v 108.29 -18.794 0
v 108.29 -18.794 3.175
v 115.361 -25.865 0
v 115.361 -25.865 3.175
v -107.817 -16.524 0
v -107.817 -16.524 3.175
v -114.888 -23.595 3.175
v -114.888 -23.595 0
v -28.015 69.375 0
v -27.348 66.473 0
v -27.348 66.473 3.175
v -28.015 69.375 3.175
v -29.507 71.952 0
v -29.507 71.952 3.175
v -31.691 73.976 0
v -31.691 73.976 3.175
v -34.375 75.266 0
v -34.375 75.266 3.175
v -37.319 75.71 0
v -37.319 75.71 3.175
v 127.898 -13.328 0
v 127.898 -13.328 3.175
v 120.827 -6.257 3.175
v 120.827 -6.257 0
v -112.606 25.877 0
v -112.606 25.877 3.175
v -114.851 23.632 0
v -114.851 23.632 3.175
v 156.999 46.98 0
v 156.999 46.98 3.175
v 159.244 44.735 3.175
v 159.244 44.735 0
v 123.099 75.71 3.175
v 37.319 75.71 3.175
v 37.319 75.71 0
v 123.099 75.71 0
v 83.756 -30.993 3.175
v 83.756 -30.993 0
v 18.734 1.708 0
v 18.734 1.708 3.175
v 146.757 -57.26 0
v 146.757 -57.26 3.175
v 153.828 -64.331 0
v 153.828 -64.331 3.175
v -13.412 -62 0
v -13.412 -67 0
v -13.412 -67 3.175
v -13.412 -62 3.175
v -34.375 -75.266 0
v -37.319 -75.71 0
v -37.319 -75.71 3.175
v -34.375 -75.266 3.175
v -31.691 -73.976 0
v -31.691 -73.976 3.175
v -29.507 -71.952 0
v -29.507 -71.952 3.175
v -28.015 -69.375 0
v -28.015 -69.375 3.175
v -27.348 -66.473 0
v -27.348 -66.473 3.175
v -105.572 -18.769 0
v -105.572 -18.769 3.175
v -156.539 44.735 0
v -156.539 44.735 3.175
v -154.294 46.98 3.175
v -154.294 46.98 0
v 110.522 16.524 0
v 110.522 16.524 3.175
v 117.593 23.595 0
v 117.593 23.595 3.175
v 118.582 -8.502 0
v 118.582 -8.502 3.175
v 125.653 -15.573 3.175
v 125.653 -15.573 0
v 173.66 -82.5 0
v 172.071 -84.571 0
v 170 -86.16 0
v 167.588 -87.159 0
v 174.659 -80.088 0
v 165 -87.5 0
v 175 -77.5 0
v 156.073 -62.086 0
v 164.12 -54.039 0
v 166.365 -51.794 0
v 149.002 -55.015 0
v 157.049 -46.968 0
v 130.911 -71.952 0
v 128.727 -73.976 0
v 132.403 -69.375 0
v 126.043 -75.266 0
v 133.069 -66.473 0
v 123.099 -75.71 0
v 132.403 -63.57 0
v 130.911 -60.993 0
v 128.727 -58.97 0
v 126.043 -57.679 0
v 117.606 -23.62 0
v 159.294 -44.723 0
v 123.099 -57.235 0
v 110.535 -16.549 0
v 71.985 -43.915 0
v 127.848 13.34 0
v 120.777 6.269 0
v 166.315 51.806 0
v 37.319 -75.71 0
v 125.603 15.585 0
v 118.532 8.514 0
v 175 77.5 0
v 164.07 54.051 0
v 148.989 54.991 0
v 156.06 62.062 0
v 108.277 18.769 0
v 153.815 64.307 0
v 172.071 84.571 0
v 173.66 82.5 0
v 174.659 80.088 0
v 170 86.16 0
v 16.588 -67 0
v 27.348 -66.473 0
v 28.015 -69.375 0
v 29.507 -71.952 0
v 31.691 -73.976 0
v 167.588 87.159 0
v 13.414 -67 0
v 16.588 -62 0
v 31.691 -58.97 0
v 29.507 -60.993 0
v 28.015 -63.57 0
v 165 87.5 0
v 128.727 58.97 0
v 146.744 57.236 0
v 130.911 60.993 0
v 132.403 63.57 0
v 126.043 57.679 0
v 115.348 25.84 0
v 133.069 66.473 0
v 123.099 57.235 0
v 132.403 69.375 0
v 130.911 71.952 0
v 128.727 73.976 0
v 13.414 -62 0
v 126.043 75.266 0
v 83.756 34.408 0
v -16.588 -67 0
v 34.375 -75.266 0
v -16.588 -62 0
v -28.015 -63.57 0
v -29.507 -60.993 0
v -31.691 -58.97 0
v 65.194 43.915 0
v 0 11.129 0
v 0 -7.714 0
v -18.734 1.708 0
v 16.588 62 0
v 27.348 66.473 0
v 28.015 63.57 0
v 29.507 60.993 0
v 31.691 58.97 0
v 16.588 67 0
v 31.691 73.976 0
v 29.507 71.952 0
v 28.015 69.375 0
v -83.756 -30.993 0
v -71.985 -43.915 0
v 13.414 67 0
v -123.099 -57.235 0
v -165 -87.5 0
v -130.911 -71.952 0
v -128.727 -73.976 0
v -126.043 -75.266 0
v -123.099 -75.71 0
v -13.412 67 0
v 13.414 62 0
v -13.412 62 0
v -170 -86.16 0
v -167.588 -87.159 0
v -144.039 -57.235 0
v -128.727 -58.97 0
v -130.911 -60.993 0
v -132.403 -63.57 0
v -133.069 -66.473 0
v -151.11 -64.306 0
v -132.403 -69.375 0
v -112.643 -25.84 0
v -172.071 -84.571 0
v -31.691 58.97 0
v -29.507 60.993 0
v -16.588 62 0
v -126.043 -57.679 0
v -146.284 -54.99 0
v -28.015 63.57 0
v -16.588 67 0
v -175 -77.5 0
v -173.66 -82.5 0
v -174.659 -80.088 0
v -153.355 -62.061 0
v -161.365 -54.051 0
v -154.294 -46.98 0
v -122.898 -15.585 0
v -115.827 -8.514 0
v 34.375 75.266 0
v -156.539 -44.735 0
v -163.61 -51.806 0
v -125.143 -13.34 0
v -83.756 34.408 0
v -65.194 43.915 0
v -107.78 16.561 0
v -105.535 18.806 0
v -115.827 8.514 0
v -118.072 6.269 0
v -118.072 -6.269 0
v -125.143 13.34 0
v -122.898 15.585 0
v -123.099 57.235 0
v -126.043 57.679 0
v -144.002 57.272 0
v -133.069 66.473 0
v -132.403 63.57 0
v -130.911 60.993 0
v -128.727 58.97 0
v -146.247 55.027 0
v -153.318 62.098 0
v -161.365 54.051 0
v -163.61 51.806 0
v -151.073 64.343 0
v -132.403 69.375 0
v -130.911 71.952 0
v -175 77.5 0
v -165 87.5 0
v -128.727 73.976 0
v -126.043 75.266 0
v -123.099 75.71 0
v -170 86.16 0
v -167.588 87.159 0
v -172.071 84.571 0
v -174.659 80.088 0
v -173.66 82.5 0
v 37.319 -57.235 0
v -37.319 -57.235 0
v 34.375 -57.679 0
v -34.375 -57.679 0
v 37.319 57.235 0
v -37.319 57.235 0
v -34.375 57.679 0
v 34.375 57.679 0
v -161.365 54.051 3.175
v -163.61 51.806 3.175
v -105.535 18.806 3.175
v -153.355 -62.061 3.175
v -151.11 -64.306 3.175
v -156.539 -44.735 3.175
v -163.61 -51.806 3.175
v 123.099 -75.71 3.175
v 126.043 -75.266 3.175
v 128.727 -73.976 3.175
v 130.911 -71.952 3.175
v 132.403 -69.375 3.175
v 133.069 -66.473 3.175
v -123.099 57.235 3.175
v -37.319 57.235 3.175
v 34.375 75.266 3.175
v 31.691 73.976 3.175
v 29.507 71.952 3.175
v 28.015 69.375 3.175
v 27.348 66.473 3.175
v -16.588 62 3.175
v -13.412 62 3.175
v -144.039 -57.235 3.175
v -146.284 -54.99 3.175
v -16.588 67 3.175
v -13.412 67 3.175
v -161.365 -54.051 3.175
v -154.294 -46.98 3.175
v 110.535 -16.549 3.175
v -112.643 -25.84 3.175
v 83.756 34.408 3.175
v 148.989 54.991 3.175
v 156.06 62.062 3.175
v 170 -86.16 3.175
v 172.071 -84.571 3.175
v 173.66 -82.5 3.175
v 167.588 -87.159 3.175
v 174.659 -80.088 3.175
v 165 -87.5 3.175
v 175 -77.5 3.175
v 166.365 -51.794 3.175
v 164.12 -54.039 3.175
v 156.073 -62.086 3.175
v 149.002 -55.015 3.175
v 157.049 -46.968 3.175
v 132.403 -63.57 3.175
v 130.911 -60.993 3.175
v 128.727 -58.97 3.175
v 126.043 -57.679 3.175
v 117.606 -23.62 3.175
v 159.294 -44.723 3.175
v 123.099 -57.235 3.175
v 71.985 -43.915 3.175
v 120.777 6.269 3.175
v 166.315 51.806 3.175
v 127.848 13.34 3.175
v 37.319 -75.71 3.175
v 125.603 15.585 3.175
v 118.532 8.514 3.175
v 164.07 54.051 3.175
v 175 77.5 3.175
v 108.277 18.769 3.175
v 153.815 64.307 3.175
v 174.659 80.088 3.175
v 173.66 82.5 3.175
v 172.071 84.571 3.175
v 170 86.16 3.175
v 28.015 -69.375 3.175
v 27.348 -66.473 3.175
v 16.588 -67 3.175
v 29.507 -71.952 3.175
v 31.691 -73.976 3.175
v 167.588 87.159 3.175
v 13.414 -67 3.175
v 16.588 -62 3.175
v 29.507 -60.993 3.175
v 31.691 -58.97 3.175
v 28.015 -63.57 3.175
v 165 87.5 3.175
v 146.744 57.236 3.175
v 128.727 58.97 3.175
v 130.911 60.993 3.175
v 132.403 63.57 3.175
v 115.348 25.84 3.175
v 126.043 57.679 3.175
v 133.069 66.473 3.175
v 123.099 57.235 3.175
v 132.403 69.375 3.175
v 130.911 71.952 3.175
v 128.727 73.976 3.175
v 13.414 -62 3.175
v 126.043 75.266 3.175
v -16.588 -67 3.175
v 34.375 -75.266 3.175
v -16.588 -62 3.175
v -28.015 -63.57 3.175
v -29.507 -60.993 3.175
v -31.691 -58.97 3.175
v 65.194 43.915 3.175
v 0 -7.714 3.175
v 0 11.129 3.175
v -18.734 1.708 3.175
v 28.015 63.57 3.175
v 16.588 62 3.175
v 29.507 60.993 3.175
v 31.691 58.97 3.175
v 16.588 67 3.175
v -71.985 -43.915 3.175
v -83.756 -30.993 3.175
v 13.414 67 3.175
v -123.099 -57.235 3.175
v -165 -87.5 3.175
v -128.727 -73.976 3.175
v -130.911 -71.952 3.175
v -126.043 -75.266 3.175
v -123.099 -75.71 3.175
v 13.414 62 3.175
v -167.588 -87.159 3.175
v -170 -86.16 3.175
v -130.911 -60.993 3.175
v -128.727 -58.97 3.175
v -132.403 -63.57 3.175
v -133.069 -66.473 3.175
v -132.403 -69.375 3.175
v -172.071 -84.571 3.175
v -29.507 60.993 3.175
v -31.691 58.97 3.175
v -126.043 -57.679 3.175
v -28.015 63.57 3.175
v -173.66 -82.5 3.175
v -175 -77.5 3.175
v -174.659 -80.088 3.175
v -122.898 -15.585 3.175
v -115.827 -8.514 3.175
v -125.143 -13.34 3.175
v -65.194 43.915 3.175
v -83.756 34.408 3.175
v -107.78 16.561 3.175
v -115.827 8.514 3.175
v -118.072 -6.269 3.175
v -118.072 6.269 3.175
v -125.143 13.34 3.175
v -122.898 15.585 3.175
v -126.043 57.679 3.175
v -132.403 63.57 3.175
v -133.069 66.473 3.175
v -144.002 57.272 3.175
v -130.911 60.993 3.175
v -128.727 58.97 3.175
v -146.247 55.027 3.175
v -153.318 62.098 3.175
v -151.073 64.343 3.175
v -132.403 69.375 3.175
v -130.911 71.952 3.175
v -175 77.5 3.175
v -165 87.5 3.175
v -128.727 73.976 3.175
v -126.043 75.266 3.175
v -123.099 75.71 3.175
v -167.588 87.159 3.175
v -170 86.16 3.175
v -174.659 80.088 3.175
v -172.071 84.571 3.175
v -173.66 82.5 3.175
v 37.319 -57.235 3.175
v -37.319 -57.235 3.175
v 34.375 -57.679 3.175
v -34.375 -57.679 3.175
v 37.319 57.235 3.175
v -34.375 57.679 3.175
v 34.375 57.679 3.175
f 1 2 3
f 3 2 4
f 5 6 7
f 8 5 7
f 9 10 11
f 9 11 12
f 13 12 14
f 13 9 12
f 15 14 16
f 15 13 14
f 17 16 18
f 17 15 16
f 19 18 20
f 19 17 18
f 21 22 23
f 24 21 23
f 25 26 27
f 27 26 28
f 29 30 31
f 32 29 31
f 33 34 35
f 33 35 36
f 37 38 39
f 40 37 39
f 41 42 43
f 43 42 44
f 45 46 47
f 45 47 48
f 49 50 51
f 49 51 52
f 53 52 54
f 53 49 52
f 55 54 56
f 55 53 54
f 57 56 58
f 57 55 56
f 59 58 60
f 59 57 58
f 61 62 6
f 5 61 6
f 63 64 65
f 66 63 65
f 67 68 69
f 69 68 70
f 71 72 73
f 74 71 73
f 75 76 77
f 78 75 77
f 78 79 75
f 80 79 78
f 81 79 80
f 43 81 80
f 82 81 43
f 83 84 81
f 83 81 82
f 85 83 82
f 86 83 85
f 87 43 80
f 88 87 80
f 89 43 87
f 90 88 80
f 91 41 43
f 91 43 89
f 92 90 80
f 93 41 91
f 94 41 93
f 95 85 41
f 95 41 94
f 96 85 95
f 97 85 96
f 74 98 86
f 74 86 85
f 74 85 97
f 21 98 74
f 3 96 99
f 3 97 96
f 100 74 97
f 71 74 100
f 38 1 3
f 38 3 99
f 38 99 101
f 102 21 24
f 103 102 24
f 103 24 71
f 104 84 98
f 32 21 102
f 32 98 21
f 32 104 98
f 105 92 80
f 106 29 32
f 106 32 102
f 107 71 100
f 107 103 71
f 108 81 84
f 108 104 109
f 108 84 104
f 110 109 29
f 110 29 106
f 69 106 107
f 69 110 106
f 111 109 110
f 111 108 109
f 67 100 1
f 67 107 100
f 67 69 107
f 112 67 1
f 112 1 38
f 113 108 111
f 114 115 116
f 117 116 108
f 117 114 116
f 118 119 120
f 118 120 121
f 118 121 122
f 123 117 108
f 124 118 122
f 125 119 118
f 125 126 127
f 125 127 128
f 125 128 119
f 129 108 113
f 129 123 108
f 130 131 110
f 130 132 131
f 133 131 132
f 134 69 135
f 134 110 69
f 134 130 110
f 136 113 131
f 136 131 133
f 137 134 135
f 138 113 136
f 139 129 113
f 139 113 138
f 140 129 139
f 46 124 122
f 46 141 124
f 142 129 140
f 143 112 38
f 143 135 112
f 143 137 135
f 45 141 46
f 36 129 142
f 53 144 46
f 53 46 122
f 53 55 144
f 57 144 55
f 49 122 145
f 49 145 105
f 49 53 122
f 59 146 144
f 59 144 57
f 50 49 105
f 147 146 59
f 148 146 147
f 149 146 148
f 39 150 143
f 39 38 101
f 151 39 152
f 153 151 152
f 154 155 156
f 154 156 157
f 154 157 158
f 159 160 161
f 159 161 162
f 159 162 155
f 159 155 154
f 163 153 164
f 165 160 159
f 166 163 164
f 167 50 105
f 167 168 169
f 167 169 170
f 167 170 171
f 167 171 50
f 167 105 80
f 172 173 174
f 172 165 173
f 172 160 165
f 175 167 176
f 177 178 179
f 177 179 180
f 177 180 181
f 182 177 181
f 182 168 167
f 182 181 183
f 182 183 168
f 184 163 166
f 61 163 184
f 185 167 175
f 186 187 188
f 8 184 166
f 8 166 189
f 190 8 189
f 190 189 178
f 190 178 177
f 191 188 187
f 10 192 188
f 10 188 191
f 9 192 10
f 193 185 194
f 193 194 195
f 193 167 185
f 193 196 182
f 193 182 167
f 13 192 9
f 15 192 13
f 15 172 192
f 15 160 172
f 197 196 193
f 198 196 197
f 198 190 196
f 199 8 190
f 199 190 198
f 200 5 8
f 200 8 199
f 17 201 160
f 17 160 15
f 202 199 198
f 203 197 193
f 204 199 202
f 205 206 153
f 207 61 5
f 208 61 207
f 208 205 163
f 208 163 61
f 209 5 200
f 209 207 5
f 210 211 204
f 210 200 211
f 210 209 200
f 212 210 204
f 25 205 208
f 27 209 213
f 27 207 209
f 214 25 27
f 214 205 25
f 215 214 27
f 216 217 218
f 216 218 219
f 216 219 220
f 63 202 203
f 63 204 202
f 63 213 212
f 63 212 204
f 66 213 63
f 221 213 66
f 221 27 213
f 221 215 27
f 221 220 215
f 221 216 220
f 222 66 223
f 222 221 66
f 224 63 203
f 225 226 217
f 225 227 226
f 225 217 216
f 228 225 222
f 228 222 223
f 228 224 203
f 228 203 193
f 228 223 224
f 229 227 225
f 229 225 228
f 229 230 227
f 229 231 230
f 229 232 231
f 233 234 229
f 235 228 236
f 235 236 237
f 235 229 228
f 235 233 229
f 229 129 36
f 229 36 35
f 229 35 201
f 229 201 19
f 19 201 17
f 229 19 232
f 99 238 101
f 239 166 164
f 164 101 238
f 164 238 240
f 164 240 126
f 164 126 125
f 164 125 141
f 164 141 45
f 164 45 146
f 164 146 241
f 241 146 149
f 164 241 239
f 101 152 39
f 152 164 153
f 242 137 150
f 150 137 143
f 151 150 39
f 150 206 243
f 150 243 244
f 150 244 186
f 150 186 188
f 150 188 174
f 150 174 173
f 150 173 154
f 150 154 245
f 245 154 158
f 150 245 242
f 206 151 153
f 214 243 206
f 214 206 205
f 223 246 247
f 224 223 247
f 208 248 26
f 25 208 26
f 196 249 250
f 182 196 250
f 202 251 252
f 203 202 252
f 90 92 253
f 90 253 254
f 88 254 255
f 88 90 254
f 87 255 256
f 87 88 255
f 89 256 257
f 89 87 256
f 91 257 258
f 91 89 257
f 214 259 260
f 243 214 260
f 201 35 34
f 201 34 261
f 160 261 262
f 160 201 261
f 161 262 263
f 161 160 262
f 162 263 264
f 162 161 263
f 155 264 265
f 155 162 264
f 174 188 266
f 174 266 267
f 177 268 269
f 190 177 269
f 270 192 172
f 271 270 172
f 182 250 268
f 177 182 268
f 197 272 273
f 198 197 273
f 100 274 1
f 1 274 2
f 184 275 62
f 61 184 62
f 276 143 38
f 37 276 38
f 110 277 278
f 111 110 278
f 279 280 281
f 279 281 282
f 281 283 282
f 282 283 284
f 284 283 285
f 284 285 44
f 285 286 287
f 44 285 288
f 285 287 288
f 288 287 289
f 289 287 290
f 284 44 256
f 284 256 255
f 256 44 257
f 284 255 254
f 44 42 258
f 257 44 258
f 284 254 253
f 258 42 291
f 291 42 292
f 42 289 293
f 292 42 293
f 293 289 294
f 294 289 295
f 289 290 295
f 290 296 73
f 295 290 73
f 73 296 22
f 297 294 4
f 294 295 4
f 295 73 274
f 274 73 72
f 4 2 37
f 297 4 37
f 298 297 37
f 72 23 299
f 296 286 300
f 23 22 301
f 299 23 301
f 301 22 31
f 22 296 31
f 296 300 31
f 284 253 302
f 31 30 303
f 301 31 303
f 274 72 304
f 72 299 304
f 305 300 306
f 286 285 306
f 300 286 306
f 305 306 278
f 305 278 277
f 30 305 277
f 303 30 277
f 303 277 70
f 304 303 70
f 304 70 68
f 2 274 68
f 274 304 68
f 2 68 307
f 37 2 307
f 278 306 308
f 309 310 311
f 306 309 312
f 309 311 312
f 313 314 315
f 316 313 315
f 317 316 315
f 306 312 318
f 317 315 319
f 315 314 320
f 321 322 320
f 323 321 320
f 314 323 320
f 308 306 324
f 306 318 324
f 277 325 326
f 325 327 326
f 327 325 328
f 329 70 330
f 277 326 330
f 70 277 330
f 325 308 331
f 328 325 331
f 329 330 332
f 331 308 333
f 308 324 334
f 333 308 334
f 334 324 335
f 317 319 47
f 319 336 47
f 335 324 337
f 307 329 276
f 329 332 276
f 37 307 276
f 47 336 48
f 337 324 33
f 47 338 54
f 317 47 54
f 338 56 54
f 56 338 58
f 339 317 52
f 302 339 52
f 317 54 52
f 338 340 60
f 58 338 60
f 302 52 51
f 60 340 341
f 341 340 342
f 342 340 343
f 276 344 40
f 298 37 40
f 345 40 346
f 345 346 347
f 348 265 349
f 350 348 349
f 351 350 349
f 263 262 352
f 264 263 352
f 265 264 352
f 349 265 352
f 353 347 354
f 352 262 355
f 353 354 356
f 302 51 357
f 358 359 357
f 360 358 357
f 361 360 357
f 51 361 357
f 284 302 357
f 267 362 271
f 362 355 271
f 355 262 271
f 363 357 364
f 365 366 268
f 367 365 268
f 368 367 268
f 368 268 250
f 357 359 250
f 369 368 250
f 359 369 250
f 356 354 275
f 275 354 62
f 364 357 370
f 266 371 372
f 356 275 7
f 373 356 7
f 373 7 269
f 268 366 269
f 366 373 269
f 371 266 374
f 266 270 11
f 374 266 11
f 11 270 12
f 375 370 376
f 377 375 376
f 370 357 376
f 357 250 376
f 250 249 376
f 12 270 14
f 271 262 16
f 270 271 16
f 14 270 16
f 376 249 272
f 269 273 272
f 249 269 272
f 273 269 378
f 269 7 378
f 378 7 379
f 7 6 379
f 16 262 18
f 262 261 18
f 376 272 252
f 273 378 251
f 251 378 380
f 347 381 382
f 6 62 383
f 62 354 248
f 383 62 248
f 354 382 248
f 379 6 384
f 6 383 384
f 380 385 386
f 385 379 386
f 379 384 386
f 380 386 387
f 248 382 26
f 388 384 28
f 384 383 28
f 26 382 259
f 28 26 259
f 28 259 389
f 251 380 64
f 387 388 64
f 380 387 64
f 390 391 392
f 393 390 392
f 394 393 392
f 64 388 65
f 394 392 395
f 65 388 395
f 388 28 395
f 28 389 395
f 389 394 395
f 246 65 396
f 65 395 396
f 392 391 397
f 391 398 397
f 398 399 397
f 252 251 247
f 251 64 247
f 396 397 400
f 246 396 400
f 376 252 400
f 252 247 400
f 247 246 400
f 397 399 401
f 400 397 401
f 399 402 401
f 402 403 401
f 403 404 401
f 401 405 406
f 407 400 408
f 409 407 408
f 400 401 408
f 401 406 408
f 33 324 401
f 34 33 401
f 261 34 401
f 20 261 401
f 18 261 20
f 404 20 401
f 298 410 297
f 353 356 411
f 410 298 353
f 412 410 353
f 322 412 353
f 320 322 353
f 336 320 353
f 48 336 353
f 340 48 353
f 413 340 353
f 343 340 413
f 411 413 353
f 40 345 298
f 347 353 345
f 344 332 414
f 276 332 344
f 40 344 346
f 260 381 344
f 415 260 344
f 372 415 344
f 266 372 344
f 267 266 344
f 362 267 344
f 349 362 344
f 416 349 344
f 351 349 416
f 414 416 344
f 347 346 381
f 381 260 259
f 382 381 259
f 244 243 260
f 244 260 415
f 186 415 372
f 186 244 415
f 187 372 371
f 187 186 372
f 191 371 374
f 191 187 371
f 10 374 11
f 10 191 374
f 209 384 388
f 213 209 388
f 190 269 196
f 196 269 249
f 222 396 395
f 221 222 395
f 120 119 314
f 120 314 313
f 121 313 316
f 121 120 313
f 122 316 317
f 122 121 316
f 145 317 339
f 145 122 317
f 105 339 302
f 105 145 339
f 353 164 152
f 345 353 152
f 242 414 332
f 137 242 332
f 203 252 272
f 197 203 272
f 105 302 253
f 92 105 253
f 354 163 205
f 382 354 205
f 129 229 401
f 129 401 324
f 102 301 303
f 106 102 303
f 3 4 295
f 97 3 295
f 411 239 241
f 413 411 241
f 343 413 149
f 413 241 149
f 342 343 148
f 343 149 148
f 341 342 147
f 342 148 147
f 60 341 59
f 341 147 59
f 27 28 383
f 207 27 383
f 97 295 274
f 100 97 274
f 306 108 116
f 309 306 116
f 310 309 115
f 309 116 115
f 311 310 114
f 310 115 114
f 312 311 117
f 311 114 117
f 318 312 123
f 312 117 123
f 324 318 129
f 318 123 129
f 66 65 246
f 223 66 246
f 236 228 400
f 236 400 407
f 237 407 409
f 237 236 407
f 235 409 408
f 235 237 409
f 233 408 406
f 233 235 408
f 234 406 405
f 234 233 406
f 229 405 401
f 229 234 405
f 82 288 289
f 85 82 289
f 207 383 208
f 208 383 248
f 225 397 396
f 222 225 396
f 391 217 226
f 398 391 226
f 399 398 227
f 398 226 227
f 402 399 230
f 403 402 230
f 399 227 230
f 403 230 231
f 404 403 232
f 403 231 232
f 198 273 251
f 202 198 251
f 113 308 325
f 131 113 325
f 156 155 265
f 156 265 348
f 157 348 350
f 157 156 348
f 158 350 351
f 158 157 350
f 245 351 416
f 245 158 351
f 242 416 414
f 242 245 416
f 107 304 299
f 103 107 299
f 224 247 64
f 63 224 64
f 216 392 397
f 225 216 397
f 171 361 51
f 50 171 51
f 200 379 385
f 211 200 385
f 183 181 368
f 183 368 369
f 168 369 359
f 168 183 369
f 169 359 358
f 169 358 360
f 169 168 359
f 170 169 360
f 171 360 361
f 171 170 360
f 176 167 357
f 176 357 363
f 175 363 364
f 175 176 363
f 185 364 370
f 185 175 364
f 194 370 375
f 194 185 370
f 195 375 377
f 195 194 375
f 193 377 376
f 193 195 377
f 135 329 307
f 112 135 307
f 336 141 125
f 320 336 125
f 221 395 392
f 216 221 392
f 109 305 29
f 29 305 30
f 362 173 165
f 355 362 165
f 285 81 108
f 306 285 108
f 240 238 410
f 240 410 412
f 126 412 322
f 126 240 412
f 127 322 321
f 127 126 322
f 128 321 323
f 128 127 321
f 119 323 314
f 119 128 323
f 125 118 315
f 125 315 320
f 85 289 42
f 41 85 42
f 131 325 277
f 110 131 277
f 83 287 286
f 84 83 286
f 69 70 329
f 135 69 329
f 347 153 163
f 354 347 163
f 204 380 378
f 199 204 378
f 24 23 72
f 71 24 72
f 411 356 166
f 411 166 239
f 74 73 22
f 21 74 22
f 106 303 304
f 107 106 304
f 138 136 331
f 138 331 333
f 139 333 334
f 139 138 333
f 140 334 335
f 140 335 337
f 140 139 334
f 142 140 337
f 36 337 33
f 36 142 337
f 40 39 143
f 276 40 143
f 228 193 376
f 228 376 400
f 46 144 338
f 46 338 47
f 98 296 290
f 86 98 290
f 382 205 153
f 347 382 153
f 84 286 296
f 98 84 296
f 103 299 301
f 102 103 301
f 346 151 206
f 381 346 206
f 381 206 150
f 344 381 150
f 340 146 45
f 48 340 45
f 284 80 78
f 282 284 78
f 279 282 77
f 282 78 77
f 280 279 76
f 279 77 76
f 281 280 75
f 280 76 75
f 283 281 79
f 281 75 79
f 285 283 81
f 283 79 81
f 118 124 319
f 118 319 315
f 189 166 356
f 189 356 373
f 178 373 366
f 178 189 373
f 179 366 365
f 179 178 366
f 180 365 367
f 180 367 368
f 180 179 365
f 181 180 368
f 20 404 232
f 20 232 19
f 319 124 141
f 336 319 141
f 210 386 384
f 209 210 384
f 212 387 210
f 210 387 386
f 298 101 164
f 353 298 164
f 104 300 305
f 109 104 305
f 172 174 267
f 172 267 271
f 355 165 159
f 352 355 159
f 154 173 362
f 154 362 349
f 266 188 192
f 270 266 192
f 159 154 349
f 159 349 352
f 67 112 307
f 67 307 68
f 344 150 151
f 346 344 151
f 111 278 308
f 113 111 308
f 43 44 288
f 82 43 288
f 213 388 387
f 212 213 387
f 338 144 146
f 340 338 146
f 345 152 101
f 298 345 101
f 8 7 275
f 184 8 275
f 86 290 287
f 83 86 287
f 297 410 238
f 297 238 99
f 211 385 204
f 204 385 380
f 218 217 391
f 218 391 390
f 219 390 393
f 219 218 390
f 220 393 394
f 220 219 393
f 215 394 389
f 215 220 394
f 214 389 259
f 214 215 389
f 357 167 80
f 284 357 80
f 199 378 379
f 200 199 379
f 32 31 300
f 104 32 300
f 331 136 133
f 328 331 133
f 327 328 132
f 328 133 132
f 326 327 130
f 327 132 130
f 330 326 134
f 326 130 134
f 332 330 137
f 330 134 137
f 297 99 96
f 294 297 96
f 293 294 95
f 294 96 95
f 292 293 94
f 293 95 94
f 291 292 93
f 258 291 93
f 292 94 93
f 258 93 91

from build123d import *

# Parameters (mm, degrees)
F0_W        = 350
F0_H        = 175
F0_W_2      = 3.175
F0_H_2      = 5
F1_DEPTH    = 3.175
F3_DEPTH    = 25
F4_W        = 105.779197067
F4_H        = 18.4744439814
F5_DEPTH    = 25
F6_T1_DEPTH = 3.175
F6_T3_DEPTH = 53.175
F8_DEPTH    = 25


# Not quite as in the source:
# - a fillet or chamfer that OpenCascade refuses, or shapes differently, is made with other operations: its cross-section is extruded or revolved along the edge and cut away or added


with BuildPart() as f1:
    # F0 (on Top) → F1 (new body)
    with BuildSketch(Plane.XY):
        Rectangle(F0_W, F0_H)
        with Locations((-15, -64.5)):
            Rectangle(F0_W_2, F0_H_2, mode=Mode.SUBTRACT)
        with Locations((15.001, -64.5)):
            Rectangle(F0_W_2, F0_H_2, mode=Mode.SUBTRACT)
        with Locations((-15, 64.5)):
            Rectangle(F0_W_2, F0_H_2, mode=Mode.SUBTRACT)
        with Locations((15.001, 64.5)):
            Rectangle(F0_W_2, F0_H_2, mode=Mode.SUBTRACT)
    extrude(amount=F1_DEPTH)

    # F2 (on face) → F3 (cut)
    with BuildSketch(Plane.XY.offset(3.175)):
        Polygon((-156.5389321881, -44.7351793874), (-163.61, -51.8062471993), (-161.3649359697, -54.0513112295), (-154.2938681579, -46.9802434177), align=None)
        Polygon((-146.2837625406, -54.9903490349), (-153.3548303525, -62.0614168468), (-151.1097663222, -64.3064808771), (-144.0386985103, -57.2354130652), align=None)
        Polygon((159.2439321881, 44.7353613385), (166.315, 51.8064291503), (164.0699359697, 54.0514931806), (156.9988681579, 46.9804253687), align=None)
        Polygon((148.9887625406, 54.990530986), (156.0598303525, 62.0615987979), (153.8147663222, 64.3066628282), (146.7436985103, 57.2355950163), align=None)
        Polygon((-161.3649359697, 54.0513112295), (-163.61, 51.8062471993), (-156.5389321881, 44.7351793874), (-154.2938681579, 46.9802434177), align=None)
        Polygon((-151.0729967696, 64.3432504297), (-153.3180607998, 62.0981863994), (-146.246992988, 55.0271185876), (-144.0019289577, 57.2721826178), align=None)
        Polygon((157.0488681579, -46.9683818087), (164.1199359697, -54.0394496205), (166.365, -51.7943855903), (159.2939321881, -44.7233177784), align=None)
        Polygon((146.7569289577, -57.2603210088), (153.8279967696, -64.3313888207), (156.0730607998, -62.0863247904), (149.001992988, -55.0152569786), align=None)
        Polygon((118.5822592613, -8.5017729121), (125.6533270732, -15.572840724), (127.8983911035, -13.3277766937), (120.8273232916, -6.2567088818), align=None)
        Polygon((108.2903200611, -18.7937121123), (115.361387873, -25.8647799241), (117.6064519033, -23.6197158939), (110.5353840914, -16.548648082), align=None)
        Polygon((120.7773232916, 6.2687524419), (127.8483911035, 13.3398202538), (125.6033270732, 15.5848842841), (118.5322592613, 8.5138164722), align=None)
        Polygon((110.522153644, 16.5239220895), (117.5932214559, 23.5949899013), (115.3481574256, 25.8400539316), (108.2770896138, 18.7689861197), align=None)
        Polygon((-122.8983270732, 15.584702333), (-125.1433911035, 13.3396383027), (-118.0723232916, 6.2685704909), (-115.8272592613, 8.5136345211), align=None)
        Polygon((-112.606387873, 25.8766415332), (-114.8514519033, 23.6315775029), (-107.7803840914, 16.560509691), (-105.5353200611, 18.8055737213), align=None)
        Polygon((-118.0723232916, -6.2685704909), (-125.1433911035, -13.3396383027), (-122.8983270732, -15.584702333), (-115.8272592613, -8.5136345211), align=None)
        Polygon((-107.817153644, -16.5237401384), (-114.8882214559, -23.5948079503), (-112.6431574256, -25.8398719805), (-105.5720896138, -18.7688041687), align=None)
    extrude(amount=-F3_DEPTH, mode=Mode.SUBTRACT)

    # F4 (on face) → F5 (cut)
    with BuildSketch(Plane.XY.offset(3.175)):
        with Locations((-80.2089292556, 66.4726350559)):
            Rectangle(F4_W, F4_H)
        with Locations((-80.2089292556, -66.4726350559)):
            Rectangle(F4_W, F4_H)
        with Locations((80.2089292556, -66.4726350559)):
            Rectangle(F4_W, F4_H)
        with Locations((80.2089292556, 66.4726350559)):
            Rectangle(F4_W, F4_H)
    extrude(amount=-F5_DEPTH, mode=Mode.SUBTRACT)

    # F6: fillet of radius 10 on 20 edges, made by hand

    # F6_s2 → F6_t1 (join)
    with BuildSketch(Plane.XY):
        with BuildLine():
            ThreePointArc((-133.0985277891, -65.7098570466), (-130.169595601, -72.7809248585), (-123.0985277891, -75.7098570466))
            Line((-123.0985277891, -75.7098570466), (-133.0985277891, -75.7098570466))
            Line((-133.0985277891, -75.7098570466), (-133.0985277891, -65.7098570466))
        make_face()
        with BuildLine():
            ThreePointArc((-123.0985277891, -57.2354130652), (-130.169595601, -60.1643452533), (-133.0985277891, -67.2354130652))
            Line((-133.0985277891, -67.2354130652), (-133.0985277891, -57.2354130652))
            Line((-133.0985277891, -57.2354130652), (-123.0985277891, -57.2354130652))
        make_face()
        with BuildLine():
            ThreePointArc((-37.3193307221, -57.2354130652), (-30.2482629102, -60.1643452533), (-27.3193307221, -67.2354130652))
            Line((-27.3193307221, -67.2354130652), (-27.3193307221, -57.2354130652))
            Line((-27.3193307221, -57.2354130652), (-37.3193307221, -57.2354130652))
        make_face()
        with BuildLine():
            ThreePointArc((-37.3193307221, -75.7098570466), (-30.2482629102, -72.7809248585), (-27.3193307221, -65.7098570466))
            Line((-27.3193307221, -65.7098570466), (-27.3193307221, -75.7098570466))
            Line((-27.3193307221, -75.7098570466), (-37.3193307221, -75.7098570466))
        make_face()
        with BuildLine():
            ThreePointArc((123.0985277891, -57.2354130652), (130.169595601, -60.1643452533), (133.0985277891, -67.2354130652))
            Line((133.0985277891, -67.2354130652), (133.0985277891, -57.2354130652))
            Line((133.0985277891, -57.2354130652), (123.0985277891, -57.2354130652))
        make_face()
        with BuildLine():
            ThreePointArc((123.0985277891, -75.7098570466), (130.169595601, -72.7809248585), (133.0985277891, -65.7098570466))
            Line((133.0985277891, -65.7098570466), (133.0985277891, -75.7098570466))
            Line((133.0985277891, -75.7098570466), (123.0985277891, -75.7098570466))
        make_face()
        with BuildLine():
            ThreePointArc((37.3193307221, -57.2354130652), (30.2482629102, -60.1643452533), (27.3193307221, -67.2354130652))
            Line((27.3193307221, -67.2354130652), (27.3193307221, -57.2354130652))
            Line((27.3193307221, -57.2354130652), (37.3193307221, -57.2354130652))
        make_face()
        with BuildLine():
            ThreePointArc((27.3193307221, -65.7098570466), (30.2482629102, -72.7809248585), (37.3193307221, -75.7098570466))
            Line((37.3193307221, -75.7098570466), (27.3193307221, -75.7098570466))
            Line((27.3193307221, -75.7098570466), (27.3193307221, -65.7098570466))
        make_face()
        with BuildLine():
            ThreePointArc((133.0985277891, 65.7098570466), (130.169595601, 72.7809248585), (123.0985277891, 75.7098570466))
            Line((123.0985277891, 75.7098570466), (133.0985277891, 75.7098570466))
            Line((133.0985277891, 75.7098570466), (133.0985277891, 65.7098570466))
        make_face()
        with BuildLine():
            ThreePointArc((133.0985277891, 67.2354130652), (130.169595601, 60.1643452533), (123.0985277891, 57.2354130652))
            Line((123.0985277891, 57.2354130652), (133.0985277891, 57.2354130652))
            Line((133.0985277891, 57.2354130652), (133.0985277891, 67.2354130652))
        make_face()
        with BuildLine():
            ThreePointArc((37.3193307221, 75.7098570466), (30.2482629102, 72.7809248585), (27.3193307221, 65.7098570466))
            Line((27.3193307221, 65.7098570466), (27.3193307221, 75.7098570466))
            Line((27.3193307221, 75.7098570466), (37.3193307221, 75.7098570466))
        make_face()
        with BuildLine():
            ThreePointArc((27.3193307221, 67.2354130652), (30.2482629102, 60.1643452533), (37.3193307221, 57.2354130652))
            Line((37.3193307221, 57.2354130652), (27.3193307221, 57.2354130652))
            Line((27.3193307221, 57.2354130652), (27.3193307221, 67.2354130652))
        make_face()
        with BuildLine():
            ThreePointArc((-27.3193307221, 65.7098570466), (-30.2482629102, 72.7809248585), (-37.3193307221, 75.7098570466))
            Line((-37.3193307221, 75.7098570466), (-27.3193307221, 75.7098570466))
            Line((-27.3193307221, 75.7098570466), (-27.3193307221, 65.7098570466))
        make_face()
        with BuildLine():
            ThreePointArc((-37.3193307221, 57.2354130652), (-30.2482629102, 60.1643452533), (-27.3193307221, 67.2354130652))
            Line((-27.3193307221, 67.2354130652), (-27.3193307221, 57.2354130652))
            Line((-27.3193307221, 57.2354130652), (-37.3193307221, 57.2354130652))
        make_face()
        with BuildLine():
            ThreePointArc((-133.0985277891, 67.2354130652), (-130.169595601, 60.1643452533), (-123.0985277891, 57.2354130652))
            Line((-123.0985277891, 57.2354130652), (-133.0985277891, 57.2354130652))
            Line((-133.0985277891, 57.2354130652), (-133.0985277891, 67.2354130652))
        make_face()
        with BuildLine():
            ThreePointArc((-133.0985277891, 65.7098570466), (-130.169595601, 72.7809248585), (-123.0985277891, 75.7098570466))
            Line((-123.0985277891, 75.7098570466), (-133.0985277891, 75.7098570466))
            Line((-133.0985277891, 75.7098570466), (-133.0985277891, 65.7098570466))
        make_face()
    extrude(amount=F6_T1_DEPTH)

    # F6_s4 → F6_t3 (cut)
    with BuildSketch(Plane.XY.offset(-25)):
        with BuildLine():
            ThreePointArc((-175, 77.5), (-172.0710678119, 84.5710678119), (-165, 87.5))
            Line((-165, 87.5), (-175, 87.5))
            Line((-175, 87.5), (-175, 77.5))
        make_face()
        with BuildLine():
            ThreePointArc((175, 77.5), (172.0710678119, 84.5710678119), (165, 87.5))
            Line((165, 87.5), (175, 87.5))
            Line((175, 87.5), (175, 77.5))
        make_face()
        with BuildLine():
            ThreePointArc((165, -87.5), (172.0710678119, -84.5710678119), (175, -77.5))
            Line((175, -77.5), (175, -87.5))
            Line((175, -87.5), (165, -87.5))
        make_face()
        with BuildLine():
            ThreePointArc((-165, -87.5), (-172.0710678119, -84.5710678119), (-175, -77.5))
            Line((-175, -77.5), (-175, -87.5))
            Line((-175, -87.5), (-165, -87.5))
        make_face()
    extrude(amount=F6_T3_DEPTH, mode=Mode.SUBTRACT)

    # F7 (on face) → F8 (cut)
    with BuildSketch(Plane(origin=(0, 0, 0), x_dir=(1, 0, 0), z_dir=(0, 0, -1))):
        Polygon((83.7561041117, 30.9926522097), (18.7335789211, -1.7076288749), (83.7561041117, -34.4079099596), align=None)
        Polygon((65.1939362288, -43.915361166), (0, -11.1288762757), (-65.1939362288, -43.915361166), align=None)
        Polygon((-18.7335789211, -1.7076288749), (-83.7561041117, 30.9926522097), (-83.7561041117, -34.4079099596), align=None)
        Polygon((71.9849690795, 43.915361166), (-71.9849690795, 43.915361166), (0, 7.7136185258), align=None)
    extrude(amount=-F8_DEPTH, mode=Mode.SUBTRACT)


solid = f1.part
